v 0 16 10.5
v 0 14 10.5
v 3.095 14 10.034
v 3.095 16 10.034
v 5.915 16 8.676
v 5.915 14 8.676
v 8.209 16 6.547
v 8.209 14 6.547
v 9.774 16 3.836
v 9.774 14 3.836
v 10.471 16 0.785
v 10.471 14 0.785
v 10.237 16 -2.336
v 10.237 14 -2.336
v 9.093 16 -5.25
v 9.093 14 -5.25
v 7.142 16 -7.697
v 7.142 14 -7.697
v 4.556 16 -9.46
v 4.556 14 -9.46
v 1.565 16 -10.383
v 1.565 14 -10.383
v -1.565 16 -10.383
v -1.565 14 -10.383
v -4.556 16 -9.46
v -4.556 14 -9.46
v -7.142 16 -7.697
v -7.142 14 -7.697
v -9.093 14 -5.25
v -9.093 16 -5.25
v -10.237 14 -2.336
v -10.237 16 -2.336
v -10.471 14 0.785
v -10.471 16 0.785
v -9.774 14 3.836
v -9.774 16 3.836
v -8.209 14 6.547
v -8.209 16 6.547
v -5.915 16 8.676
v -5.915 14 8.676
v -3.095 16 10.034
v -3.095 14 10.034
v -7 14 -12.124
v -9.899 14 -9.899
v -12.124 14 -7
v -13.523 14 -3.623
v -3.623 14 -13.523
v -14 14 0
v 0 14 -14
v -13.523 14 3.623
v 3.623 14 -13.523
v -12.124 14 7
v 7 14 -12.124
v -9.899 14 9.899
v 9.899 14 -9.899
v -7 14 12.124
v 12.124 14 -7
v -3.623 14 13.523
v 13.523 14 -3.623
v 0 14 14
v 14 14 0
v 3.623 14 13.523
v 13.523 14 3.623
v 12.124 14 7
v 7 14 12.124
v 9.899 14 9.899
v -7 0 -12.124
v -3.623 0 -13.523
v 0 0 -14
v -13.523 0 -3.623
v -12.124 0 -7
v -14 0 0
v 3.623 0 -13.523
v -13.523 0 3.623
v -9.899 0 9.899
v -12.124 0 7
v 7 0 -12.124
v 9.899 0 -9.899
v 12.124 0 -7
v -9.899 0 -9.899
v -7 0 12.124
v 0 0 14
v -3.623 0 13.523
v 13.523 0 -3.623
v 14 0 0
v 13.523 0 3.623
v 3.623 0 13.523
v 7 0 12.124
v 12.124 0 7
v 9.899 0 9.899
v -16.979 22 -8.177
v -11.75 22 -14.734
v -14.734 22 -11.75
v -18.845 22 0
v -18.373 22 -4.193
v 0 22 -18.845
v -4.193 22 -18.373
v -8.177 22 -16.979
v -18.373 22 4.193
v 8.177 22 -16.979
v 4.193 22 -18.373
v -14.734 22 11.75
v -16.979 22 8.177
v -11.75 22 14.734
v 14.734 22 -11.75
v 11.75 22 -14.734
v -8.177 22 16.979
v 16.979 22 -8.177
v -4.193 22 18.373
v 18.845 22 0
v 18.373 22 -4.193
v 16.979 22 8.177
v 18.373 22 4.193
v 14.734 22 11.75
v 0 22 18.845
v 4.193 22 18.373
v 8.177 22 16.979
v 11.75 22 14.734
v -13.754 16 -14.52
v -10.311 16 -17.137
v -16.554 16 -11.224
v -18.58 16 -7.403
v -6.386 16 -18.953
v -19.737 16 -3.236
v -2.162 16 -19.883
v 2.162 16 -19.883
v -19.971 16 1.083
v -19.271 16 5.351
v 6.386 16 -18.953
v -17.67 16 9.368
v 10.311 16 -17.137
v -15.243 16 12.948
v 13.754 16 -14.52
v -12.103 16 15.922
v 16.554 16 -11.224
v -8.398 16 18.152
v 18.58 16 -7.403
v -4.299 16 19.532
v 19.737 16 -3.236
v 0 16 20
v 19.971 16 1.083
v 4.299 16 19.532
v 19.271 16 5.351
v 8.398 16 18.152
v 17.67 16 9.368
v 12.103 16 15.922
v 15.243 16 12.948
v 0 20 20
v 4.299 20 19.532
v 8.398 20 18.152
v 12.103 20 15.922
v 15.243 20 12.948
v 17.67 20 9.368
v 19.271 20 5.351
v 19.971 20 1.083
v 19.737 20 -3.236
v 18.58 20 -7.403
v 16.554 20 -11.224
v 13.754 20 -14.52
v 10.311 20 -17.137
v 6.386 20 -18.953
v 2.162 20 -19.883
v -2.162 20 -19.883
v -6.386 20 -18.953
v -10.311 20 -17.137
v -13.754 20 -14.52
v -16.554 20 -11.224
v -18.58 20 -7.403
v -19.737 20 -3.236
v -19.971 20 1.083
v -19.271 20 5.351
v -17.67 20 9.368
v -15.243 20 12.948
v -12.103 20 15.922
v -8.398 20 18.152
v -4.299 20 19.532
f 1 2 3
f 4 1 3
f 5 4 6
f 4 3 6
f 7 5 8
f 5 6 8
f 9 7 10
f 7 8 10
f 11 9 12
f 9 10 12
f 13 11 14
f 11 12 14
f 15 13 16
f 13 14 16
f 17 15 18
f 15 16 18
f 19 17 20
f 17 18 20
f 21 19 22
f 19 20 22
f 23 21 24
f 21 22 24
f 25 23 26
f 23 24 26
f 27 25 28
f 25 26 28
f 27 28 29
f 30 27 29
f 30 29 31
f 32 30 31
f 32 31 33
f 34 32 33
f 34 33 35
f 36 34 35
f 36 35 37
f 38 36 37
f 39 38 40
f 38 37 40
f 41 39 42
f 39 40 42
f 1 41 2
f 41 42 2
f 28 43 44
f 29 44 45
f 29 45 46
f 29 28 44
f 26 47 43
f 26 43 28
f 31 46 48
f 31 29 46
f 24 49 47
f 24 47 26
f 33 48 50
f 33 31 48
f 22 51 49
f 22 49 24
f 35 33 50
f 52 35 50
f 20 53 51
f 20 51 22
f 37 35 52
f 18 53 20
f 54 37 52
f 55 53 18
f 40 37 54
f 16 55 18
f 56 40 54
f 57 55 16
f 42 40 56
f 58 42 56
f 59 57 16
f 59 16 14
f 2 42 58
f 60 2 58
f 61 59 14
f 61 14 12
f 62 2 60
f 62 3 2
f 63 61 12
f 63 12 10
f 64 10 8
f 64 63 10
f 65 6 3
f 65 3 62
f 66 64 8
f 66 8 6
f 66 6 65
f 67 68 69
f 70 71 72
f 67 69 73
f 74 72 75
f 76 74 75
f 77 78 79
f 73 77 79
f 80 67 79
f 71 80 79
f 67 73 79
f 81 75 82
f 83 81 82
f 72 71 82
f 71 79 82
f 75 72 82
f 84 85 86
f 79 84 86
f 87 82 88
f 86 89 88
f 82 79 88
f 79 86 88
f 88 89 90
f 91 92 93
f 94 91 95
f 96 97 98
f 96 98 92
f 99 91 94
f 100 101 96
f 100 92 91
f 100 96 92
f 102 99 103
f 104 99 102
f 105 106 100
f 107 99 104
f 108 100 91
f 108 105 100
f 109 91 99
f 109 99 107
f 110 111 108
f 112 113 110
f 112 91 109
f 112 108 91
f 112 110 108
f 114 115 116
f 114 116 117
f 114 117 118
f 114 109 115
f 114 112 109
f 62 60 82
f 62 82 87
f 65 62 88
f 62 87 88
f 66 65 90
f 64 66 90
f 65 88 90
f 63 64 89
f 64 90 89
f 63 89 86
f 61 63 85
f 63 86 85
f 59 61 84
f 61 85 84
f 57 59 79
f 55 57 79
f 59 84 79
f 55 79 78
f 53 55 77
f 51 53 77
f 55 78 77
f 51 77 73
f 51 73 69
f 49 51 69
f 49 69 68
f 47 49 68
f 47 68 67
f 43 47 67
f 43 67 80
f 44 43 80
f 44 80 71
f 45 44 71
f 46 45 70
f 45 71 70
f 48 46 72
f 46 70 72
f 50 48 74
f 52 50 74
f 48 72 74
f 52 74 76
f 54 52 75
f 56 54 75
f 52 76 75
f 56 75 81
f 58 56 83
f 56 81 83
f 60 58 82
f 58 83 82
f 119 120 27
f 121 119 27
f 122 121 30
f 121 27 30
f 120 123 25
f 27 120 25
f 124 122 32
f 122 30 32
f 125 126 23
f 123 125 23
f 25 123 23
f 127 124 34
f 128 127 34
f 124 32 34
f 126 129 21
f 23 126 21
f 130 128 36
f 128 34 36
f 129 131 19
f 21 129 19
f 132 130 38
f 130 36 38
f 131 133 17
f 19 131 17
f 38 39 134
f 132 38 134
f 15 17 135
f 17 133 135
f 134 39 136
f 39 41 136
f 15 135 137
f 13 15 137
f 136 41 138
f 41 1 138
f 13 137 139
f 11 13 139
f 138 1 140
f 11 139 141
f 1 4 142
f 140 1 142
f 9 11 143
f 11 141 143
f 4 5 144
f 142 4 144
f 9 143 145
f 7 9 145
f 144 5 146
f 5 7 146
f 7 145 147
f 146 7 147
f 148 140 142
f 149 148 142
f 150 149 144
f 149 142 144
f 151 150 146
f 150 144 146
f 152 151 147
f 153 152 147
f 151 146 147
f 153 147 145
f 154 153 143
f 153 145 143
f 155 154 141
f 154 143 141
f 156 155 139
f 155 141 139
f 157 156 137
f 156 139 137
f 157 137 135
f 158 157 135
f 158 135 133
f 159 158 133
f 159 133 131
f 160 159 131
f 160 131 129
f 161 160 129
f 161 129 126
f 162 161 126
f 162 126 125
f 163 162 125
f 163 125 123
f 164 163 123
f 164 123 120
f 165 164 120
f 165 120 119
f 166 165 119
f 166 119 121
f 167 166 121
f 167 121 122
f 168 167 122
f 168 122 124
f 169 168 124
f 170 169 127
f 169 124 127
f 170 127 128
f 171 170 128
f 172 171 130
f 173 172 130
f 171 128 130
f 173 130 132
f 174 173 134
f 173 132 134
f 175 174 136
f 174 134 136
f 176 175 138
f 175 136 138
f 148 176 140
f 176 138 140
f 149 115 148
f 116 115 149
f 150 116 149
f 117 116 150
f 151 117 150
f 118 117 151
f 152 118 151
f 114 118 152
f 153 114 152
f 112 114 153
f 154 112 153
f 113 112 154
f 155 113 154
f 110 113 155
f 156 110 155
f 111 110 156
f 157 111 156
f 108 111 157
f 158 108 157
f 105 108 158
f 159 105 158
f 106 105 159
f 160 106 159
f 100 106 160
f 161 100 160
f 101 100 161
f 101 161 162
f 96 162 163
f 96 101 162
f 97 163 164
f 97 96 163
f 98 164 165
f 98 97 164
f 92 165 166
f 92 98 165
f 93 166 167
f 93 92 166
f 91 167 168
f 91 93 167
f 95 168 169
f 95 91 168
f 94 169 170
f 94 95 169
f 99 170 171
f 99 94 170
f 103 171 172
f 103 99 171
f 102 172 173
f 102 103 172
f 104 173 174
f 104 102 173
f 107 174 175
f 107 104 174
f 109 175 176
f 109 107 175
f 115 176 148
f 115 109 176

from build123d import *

# Parameters (mm, degrees)
ESQUISSE1_R        = 14
BOSS_EXTRU_1_DEPTH = 14
ESQUISSE2_R        = 10.5
BOSS_EXTRU_2_DEPTH = 2
ESQUISSE4_R        = 20
BOSS_EXTRU_3_DEPTH = 4
ESQUISSE5_R        = 20
BOSS_EXTRU_4_DEPTH = 2
CHANFREIN1_SIZE    = 2
CHANFREIN1_SIZE2   = 1.154700538


with BuildPart() as part:
    # Esquisse1 → Boss.-Extru.1 (new body)
    with BuildSketch(Plane(origin=(0, 0, 0), x_dir=(1, 0, 0), z_dir=(0, 1, 0))):
        with Locations(Location((0, 0, 0), (0, 0, 270))):
            Circle(ESQUISSE1_R)
    extrude(amount=BOSS_EXTRU_1_DEPTH)

    # Esquisse2 → Boss.-Extru.2 (add)
    with BuildSketch(Plane(origin=(0, 14, 0), x_dir=(1, 0, 0), z_dir=(0, 1, 0))):
        with Locations(Location((0, 0, 0), (0, 0, 270))):
            Circle(ESQUISSE2_R)
    extrude(amount=BOSS_EXTRU_2_DEPTH)

    # Esquisse4 → Boss.-Extru.3 (add)
    with BuildSketch(Plane(origin=(0, 16, 0), x_dir=(1, 0, 0), z_dir=(0, 1, 0))):
        with Locations(Location((0, 0, 0), (0, 0, 270))):
            Circle(ESQUISSE4_R)
    extrude(amount=BOSS_EXTRU_3_DEPTH)

    # Esquisse5 → Boss.-Extru.4 (add)
    with BuildSketch(Plane(origin=(0, 20, 0), x_dir=(1, 0, 0), z_dir=(0, 1, 0))):
        with Locations(Location((0, 0, 0), (0, 0, 270))):
            Circle(ESQUISSE5_R)
    extrude(amount=BOSS_EXTRU_4_DEPTH)

    # Chanfrein1
    chanfrein1_edges = [part.edges().sort_by_distance(p)[0] for p in [
        (0, 22, -20),
    ]]
    chanfrein1_side = [part.faces().sort_by_distance(p)[0] for p in [
        (0, 19, -20),
    ]]
    chamfer(chanfrein1_edges, length=CHANFREIN1_SIZE, length2=CHANFREIN1_SIZE2, reference=chanfrein1_side[0])


solid = part.part
